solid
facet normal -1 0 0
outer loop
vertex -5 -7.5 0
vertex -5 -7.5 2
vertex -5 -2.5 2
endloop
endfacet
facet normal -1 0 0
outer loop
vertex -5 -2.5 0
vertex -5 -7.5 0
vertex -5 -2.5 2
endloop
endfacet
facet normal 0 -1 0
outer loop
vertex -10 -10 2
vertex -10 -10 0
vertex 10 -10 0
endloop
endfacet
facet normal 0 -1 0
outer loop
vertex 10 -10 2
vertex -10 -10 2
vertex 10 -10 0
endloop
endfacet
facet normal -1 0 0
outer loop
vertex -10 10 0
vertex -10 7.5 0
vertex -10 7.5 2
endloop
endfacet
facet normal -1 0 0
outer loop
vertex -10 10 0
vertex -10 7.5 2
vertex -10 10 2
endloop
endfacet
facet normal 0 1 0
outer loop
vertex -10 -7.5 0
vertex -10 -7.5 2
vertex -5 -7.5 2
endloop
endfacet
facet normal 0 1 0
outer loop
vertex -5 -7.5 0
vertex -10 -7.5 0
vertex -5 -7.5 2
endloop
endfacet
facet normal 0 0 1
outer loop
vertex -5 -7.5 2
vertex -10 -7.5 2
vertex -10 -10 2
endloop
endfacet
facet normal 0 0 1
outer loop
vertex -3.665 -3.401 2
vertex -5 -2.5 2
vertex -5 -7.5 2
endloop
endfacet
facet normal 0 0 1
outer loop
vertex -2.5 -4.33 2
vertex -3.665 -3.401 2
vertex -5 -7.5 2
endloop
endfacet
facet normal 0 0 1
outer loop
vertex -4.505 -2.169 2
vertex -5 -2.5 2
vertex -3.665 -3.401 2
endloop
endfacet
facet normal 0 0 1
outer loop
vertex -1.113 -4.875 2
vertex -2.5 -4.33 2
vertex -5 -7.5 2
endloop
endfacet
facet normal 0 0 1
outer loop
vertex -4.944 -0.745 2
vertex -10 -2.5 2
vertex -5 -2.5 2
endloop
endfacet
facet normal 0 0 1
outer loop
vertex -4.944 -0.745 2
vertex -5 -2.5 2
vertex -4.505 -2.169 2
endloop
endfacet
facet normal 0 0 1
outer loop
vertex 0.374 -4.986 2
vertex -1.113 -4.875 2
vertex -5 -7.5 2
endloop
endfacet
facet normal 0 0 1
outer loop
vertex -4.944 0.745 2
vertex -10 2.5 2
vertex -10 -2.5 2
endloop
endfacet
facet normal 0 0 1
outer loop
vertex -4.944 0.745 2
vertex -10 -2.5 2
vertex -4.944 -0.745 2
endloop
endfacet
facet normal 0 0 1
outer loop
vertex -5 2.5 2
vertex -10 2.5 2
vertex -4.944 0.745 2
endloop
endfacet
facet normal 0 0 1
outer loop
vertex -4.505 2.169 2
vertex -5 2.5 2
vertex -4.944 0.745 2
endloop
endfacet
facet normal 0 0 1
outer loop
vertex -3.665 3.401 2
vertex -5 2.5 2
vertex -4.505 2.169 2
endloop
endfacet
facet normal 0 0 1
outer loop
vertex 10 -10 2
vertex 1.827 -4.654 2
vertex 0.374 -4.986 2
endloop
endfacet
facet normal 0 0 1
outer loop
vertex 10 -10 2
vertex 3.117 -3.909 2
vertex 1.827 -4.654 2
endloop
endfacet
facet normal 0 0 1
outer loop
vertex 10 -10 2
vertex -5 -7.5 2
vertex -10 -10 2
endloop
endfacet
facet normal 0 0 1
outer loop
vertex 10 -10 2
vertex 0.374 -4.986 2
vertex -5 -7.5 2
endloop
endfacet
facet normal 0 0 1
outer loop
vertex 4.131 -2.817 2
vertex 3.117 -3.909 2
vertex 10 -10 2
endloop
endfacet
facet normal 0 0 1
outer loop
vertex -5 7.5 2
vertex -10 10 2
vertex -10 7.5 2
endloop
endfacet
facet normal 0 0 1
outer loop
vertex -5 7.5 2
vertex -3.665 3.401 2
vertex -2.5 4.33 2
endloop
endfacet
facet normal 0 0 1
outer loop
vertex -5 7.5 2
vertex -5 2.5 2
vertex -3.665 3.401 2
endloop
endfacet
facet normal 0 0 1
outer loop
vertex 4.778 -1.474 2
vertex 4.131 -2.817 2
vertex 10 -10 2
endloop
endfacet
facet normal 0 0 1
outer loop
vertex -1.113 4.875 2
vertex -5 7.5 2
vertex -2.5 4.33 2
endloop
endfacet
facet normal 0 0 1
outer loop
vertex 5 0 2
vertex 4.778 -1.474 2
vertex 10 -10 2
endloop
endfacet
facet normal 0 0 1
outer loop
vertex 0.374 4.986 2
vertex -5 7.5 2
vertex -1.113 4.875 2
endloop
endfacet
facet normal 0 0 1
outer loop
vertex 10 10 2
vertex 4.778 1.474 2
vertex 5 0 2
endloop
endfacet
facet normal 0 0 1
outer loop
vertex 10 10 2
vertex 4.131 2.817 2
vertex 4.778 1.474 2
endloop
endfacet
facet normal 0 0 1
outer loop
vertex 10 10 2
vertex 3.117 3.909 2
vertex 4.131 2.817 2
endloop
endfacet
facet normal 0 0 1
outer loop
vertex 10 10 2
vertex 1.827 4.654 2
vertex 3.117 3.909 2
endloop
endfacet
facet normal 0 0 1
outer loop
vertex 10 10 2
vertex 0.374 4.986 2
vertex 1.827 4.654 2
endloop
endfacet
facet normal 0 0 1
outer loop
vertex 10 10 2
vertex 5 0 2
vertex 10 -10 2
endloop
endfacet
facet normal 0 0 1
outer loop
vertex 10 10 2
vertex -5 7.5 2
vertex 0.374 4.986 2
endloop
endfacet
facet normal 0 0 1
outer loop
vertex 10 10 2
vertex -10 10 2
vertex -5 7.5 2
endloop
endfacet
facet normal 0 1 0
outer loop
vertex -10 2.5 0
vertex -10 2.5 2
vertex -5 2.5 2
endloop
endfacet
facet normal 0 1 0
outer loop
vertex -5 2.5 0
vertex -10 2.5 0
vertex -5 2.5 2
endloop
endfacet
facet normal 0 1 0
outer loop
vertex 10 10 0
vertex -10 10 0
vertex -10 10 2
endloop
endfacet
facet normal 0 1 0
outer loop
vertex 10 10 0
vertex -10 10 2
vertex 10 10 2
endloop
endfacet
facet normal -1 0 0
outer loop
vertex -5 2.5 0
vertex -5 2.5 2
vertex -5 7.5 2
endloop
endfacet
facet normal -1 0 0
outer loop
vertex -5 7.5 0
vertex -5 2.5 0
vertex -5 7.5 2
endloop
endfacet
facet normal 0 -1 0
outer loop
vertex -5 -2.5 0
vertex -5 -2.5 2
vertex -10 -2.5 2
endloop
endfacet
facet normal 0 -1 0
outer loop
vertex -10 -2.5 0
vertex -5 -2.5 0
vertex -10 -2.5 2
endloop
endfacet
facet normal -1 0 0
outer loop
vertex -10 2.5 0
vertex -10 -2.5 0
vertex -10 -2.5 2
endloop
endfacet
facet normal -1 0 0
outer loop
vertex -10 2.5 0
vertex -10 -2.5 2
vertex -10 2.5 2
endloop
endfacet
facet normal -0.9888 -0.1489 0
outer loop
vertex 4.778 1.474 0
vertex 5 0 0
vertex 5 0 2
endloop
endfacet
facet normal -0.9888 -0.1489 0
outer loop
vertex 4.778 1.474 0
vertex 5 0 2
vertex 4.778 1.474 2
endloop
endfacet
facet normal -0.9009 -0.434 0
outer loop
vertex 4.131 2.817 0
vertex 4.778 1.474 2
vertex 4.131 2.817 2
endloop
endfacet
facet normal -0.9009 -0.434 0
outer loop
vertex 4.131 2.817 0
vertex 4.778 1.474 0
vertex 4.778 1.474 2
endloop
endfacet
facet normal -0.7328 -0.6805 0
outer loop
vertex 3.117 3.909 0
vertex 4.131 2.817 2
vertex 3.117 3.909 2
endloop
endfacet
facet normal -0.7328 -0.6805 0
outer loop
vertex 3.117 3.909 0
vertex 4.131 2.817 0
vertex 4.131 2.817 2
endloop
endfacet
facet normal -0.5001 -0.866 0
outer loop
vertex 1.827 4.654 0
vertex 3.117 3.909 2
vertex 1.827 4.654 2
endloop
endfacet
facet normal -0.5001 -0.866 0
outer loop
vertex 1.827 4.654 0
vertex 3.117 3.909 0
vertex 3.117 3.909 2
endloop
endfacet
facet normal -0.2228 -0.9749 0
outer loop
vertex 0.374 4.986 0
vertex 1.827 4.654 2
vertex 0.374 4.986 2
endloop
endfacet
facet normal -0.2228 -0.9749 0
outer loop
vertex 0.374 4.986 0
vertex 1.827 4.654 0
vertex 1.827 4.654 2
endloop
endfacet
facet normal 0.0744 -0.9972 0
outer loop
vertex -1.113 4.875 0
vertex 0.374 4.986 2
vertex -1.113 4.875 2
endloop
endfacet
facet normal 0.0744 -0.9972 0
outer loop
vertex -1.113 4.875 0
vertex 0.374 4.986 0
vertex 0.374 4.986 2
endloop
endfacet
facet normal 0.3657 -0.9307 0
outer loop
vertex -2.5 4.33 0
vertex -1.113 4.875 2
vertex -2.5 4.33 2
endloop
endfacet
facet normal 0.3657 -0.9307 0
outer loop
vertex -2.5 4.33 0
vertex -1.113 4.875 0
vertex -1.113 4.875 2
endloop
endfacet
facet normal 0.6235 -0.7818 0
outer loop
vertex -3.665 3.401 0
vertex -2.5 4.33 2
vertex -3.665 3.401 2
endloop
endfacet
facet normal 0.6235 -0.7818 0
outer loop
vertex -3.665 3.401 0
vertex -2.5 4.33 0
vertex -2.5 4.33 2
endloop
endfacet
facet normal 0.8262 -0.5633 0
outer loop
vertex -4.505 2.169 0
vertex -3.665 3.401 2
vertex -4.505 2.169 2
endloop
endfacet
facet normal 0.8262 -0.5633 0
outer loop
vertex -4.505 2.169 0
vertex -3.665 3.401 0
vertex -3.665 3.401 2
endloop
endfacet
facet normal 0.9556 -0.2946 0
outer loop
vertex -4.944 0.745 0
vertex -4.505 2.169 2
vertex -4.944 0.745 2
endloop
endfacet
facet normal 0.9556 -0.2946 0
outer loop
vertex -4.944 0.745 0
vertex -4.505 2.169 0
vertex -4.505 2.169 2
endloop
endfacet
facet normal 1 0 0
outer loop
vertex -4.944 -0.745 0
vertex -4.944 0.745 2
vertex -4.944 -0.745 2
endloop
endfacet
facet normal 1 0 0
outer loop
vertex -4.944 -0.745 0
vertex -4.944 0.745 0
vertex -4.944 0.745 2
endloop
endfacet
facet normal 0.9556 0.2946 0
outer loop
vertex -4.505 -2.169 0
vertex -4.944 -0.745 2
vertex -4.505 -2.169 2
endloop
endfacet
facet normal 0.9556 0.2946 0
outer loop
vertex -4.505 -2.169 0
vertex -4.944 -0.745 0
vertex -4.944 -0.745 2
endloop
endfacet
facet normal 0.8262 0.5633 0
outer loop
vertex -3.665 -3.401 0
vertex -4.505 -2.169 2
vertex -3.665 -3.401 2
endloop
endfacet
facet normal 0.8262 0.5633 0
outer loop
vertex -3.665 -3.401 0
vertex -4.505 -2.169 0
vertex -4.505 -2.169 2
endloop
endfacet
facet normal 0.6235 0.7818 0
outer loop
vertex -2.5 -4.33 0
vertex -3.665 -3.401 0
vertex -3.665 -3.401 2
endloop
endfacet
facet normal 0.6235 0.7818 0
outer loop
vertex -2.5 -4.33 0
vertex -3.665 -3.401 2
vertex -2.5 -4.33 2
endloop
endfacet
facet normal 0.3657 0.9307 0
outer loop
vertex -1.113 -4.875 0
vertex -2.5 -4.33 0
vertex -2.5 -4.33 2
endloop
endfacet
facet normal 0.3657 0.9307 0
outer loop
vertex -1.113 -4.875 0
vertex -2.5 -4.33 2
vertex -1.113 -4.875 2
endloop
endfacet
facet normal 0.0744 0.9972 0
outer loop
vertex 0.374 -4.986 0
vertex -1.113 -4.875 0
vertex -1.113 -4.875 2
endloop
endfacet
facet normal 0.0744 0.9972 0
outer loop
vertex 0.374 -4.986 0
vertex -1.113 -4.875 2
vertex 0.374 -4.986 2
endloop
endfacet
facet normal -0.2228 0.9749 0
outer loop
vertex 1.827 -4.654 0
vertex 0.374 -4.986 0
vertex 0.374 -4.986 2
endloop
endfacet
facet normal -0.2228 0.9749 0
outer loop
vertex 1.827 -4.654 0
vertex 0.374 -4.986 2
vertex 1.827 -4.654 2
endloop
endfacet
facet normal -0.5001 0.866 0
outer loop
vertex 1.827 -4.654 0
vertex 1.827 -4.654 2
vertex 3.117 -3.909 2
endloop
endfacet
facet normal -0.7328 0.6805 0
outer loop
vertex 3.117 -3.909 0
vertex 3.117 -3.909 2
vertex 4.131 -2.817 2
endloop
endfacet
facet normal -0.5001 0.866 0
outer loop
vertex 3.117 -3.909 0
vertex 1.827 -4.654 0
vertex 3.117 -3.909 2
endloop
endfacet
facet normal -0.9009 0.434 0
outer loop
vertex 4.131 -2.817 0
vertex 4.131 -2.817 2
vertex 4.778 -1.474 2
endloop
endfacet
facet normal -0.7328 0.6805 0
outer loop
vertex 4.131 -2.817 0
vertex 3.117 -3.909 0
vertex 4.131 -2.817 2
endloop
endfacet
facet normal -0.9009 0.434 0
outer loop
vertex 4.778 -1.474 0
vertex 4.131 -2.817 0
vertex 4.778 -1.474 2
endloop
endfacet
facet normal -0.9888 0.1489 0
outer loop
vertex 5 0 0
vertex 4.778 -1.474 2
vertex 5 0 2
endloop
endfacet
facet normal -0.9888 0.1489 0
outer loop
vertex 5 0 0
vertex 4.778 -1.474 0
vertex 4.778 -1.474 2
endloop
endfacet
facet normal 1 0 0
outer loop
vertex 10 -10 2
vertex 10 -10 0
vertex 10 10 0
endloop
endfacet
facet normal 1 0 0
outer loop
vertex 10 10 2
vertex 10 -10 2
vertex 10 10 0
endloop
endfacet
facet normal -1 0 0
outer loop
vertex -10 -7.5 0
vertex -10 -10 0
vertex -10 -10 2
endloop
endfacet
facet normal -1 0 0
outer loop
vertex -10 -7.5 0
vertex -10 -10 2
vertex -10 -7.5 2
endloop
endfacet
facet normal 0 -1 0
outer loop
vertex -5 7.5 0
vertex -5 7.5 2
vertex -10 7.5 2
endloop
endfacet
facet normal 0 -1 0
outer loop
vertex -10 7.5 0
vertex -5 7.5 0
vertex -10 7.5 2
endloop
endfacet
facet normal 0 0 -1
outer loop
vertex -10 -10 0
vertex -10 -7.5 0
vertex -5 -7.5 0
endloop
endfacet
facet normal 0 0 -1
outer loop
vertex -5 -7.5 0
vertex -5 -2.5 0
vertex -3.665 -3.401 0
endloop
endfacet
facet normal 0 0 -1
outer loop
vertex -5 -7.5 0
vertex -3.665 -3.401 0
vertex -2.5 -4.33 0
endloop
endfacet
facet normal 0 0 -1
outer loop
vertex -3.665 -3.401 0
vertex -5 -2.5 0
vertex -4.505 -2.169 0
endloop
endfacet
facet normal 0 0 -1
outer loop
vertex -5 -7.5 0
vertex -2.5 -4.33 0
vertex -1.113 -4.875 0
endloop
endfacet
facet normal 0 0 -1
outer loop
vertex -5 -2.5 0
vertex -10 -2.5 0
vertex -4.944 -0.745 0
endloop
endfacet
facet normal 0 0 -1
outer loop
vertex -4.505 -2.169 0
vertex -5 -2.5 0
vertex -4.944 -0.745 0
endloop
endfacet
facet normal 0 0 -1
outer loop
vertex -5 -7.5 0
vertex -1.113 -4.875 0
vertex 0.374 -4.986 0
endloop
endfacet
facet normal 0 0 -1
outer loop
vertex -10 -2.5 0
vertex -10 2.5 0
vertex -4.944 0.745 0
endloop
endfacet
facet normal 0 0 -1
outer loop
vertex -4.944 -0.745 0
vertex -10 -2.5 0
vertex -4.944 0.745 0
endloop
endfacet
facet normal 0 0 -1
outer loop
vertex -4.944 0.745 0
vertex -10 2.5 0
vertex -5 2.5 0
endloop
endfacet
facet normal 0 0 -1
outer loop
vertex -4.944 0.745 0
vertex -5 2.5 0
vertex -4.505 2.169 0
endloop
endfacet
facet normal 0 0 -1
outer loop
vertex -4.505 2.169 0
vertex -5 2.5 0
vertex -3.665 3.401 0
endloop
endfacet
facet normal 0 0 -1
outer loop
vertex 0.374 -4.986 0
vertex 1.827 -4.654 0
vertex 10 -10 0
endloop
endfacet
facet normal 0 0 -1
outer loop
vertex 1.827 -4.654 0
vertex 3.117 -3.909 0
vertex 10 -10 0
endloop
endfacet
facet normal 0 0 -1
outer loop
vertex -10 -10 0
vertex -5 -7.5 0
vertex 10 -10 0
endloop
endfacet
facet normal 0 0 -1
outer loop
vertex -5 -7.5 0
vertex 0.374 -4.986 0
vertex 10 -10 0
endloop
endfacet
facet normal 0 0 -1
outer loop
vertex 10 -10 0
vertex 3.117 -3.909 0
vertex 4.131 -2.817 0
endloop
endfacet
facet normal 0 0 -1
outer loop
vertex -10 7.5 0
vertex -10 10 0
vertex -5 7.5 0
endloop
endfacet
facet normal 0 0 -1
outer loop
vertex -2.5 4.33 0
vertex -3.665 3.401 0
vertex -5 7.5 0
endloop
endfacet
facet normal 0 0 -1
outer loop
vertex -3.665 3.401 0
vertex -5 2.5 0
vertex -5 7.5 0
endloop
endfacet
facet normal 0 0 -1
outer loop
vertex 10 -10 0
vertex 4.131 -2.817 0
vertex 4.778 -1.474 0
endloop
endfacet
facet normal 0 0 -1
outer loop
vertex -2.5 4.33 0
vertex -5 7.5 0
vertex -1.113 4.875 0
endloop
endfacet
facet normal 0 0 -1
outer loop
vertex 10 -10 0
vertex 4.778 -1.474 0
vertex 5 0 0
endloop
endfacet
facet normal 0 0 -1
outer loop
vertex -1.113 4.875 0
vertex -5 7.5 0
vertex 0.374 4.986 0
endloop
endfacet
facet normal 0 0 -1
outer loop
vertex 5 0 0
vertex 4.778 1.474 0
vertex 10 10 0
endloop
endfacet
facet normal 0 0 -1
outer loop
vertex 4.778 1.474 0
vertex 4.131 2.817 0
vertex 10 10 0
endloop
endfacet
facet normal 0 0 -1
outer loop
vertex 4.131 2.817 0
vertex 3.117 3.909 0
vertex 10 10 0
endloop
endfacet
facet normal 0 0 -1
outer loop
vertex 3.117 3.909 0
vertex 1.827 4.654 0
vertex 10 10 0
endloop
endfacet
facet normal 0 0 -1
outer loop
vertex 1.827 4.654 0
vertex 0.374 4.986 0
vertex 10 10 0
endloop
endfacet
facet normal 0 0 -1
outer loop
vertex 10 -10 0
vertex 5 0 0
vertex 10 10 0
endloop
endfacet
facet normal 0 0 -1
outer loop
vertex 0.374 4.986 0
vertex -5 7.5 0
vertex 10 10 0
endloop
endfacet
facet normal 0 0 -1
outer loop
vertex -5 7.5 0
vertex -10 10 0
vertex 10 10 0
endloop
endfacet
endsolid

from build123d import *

# Parameters (mm, degrees)
F0_W     = 20
F0_H     = 20
F0_R     = 5
F1_DEPTH = 2
F2_W     = 5
F2_H     = 5
F3_DEPTH = 2.001


with BuildPart() as f1:
    # F0 (on Top) → F1 (new body)
    with BuildSketch(Plane.XY):
        Rectangle(F0_W, F0_H)
        Circle(F0_R, mode=Mode.SUBTRACT)
    extrude(amount=F1_DEPTH)

    # F2 (on face) → F3 (cut, through all)
    with BuildSketch(Plane.XY.offset(2)):
        with Locations((-12.5, -5)):
            Rectangle(F2_W, F2_H)
        with Locations((-7.5, -5)):
            Rectangle(F2_W, F2_H)
        with Locations((-12.5, 5)):
            Rectangle(F2_W, F2_H)
        with Locations((-7.5, 5)):
            Rectangle(F2_W, F2_H)
    extrude(amount=-F3_DEPTH, mode=Mode.SUBTRACT)


solid = f1.part
